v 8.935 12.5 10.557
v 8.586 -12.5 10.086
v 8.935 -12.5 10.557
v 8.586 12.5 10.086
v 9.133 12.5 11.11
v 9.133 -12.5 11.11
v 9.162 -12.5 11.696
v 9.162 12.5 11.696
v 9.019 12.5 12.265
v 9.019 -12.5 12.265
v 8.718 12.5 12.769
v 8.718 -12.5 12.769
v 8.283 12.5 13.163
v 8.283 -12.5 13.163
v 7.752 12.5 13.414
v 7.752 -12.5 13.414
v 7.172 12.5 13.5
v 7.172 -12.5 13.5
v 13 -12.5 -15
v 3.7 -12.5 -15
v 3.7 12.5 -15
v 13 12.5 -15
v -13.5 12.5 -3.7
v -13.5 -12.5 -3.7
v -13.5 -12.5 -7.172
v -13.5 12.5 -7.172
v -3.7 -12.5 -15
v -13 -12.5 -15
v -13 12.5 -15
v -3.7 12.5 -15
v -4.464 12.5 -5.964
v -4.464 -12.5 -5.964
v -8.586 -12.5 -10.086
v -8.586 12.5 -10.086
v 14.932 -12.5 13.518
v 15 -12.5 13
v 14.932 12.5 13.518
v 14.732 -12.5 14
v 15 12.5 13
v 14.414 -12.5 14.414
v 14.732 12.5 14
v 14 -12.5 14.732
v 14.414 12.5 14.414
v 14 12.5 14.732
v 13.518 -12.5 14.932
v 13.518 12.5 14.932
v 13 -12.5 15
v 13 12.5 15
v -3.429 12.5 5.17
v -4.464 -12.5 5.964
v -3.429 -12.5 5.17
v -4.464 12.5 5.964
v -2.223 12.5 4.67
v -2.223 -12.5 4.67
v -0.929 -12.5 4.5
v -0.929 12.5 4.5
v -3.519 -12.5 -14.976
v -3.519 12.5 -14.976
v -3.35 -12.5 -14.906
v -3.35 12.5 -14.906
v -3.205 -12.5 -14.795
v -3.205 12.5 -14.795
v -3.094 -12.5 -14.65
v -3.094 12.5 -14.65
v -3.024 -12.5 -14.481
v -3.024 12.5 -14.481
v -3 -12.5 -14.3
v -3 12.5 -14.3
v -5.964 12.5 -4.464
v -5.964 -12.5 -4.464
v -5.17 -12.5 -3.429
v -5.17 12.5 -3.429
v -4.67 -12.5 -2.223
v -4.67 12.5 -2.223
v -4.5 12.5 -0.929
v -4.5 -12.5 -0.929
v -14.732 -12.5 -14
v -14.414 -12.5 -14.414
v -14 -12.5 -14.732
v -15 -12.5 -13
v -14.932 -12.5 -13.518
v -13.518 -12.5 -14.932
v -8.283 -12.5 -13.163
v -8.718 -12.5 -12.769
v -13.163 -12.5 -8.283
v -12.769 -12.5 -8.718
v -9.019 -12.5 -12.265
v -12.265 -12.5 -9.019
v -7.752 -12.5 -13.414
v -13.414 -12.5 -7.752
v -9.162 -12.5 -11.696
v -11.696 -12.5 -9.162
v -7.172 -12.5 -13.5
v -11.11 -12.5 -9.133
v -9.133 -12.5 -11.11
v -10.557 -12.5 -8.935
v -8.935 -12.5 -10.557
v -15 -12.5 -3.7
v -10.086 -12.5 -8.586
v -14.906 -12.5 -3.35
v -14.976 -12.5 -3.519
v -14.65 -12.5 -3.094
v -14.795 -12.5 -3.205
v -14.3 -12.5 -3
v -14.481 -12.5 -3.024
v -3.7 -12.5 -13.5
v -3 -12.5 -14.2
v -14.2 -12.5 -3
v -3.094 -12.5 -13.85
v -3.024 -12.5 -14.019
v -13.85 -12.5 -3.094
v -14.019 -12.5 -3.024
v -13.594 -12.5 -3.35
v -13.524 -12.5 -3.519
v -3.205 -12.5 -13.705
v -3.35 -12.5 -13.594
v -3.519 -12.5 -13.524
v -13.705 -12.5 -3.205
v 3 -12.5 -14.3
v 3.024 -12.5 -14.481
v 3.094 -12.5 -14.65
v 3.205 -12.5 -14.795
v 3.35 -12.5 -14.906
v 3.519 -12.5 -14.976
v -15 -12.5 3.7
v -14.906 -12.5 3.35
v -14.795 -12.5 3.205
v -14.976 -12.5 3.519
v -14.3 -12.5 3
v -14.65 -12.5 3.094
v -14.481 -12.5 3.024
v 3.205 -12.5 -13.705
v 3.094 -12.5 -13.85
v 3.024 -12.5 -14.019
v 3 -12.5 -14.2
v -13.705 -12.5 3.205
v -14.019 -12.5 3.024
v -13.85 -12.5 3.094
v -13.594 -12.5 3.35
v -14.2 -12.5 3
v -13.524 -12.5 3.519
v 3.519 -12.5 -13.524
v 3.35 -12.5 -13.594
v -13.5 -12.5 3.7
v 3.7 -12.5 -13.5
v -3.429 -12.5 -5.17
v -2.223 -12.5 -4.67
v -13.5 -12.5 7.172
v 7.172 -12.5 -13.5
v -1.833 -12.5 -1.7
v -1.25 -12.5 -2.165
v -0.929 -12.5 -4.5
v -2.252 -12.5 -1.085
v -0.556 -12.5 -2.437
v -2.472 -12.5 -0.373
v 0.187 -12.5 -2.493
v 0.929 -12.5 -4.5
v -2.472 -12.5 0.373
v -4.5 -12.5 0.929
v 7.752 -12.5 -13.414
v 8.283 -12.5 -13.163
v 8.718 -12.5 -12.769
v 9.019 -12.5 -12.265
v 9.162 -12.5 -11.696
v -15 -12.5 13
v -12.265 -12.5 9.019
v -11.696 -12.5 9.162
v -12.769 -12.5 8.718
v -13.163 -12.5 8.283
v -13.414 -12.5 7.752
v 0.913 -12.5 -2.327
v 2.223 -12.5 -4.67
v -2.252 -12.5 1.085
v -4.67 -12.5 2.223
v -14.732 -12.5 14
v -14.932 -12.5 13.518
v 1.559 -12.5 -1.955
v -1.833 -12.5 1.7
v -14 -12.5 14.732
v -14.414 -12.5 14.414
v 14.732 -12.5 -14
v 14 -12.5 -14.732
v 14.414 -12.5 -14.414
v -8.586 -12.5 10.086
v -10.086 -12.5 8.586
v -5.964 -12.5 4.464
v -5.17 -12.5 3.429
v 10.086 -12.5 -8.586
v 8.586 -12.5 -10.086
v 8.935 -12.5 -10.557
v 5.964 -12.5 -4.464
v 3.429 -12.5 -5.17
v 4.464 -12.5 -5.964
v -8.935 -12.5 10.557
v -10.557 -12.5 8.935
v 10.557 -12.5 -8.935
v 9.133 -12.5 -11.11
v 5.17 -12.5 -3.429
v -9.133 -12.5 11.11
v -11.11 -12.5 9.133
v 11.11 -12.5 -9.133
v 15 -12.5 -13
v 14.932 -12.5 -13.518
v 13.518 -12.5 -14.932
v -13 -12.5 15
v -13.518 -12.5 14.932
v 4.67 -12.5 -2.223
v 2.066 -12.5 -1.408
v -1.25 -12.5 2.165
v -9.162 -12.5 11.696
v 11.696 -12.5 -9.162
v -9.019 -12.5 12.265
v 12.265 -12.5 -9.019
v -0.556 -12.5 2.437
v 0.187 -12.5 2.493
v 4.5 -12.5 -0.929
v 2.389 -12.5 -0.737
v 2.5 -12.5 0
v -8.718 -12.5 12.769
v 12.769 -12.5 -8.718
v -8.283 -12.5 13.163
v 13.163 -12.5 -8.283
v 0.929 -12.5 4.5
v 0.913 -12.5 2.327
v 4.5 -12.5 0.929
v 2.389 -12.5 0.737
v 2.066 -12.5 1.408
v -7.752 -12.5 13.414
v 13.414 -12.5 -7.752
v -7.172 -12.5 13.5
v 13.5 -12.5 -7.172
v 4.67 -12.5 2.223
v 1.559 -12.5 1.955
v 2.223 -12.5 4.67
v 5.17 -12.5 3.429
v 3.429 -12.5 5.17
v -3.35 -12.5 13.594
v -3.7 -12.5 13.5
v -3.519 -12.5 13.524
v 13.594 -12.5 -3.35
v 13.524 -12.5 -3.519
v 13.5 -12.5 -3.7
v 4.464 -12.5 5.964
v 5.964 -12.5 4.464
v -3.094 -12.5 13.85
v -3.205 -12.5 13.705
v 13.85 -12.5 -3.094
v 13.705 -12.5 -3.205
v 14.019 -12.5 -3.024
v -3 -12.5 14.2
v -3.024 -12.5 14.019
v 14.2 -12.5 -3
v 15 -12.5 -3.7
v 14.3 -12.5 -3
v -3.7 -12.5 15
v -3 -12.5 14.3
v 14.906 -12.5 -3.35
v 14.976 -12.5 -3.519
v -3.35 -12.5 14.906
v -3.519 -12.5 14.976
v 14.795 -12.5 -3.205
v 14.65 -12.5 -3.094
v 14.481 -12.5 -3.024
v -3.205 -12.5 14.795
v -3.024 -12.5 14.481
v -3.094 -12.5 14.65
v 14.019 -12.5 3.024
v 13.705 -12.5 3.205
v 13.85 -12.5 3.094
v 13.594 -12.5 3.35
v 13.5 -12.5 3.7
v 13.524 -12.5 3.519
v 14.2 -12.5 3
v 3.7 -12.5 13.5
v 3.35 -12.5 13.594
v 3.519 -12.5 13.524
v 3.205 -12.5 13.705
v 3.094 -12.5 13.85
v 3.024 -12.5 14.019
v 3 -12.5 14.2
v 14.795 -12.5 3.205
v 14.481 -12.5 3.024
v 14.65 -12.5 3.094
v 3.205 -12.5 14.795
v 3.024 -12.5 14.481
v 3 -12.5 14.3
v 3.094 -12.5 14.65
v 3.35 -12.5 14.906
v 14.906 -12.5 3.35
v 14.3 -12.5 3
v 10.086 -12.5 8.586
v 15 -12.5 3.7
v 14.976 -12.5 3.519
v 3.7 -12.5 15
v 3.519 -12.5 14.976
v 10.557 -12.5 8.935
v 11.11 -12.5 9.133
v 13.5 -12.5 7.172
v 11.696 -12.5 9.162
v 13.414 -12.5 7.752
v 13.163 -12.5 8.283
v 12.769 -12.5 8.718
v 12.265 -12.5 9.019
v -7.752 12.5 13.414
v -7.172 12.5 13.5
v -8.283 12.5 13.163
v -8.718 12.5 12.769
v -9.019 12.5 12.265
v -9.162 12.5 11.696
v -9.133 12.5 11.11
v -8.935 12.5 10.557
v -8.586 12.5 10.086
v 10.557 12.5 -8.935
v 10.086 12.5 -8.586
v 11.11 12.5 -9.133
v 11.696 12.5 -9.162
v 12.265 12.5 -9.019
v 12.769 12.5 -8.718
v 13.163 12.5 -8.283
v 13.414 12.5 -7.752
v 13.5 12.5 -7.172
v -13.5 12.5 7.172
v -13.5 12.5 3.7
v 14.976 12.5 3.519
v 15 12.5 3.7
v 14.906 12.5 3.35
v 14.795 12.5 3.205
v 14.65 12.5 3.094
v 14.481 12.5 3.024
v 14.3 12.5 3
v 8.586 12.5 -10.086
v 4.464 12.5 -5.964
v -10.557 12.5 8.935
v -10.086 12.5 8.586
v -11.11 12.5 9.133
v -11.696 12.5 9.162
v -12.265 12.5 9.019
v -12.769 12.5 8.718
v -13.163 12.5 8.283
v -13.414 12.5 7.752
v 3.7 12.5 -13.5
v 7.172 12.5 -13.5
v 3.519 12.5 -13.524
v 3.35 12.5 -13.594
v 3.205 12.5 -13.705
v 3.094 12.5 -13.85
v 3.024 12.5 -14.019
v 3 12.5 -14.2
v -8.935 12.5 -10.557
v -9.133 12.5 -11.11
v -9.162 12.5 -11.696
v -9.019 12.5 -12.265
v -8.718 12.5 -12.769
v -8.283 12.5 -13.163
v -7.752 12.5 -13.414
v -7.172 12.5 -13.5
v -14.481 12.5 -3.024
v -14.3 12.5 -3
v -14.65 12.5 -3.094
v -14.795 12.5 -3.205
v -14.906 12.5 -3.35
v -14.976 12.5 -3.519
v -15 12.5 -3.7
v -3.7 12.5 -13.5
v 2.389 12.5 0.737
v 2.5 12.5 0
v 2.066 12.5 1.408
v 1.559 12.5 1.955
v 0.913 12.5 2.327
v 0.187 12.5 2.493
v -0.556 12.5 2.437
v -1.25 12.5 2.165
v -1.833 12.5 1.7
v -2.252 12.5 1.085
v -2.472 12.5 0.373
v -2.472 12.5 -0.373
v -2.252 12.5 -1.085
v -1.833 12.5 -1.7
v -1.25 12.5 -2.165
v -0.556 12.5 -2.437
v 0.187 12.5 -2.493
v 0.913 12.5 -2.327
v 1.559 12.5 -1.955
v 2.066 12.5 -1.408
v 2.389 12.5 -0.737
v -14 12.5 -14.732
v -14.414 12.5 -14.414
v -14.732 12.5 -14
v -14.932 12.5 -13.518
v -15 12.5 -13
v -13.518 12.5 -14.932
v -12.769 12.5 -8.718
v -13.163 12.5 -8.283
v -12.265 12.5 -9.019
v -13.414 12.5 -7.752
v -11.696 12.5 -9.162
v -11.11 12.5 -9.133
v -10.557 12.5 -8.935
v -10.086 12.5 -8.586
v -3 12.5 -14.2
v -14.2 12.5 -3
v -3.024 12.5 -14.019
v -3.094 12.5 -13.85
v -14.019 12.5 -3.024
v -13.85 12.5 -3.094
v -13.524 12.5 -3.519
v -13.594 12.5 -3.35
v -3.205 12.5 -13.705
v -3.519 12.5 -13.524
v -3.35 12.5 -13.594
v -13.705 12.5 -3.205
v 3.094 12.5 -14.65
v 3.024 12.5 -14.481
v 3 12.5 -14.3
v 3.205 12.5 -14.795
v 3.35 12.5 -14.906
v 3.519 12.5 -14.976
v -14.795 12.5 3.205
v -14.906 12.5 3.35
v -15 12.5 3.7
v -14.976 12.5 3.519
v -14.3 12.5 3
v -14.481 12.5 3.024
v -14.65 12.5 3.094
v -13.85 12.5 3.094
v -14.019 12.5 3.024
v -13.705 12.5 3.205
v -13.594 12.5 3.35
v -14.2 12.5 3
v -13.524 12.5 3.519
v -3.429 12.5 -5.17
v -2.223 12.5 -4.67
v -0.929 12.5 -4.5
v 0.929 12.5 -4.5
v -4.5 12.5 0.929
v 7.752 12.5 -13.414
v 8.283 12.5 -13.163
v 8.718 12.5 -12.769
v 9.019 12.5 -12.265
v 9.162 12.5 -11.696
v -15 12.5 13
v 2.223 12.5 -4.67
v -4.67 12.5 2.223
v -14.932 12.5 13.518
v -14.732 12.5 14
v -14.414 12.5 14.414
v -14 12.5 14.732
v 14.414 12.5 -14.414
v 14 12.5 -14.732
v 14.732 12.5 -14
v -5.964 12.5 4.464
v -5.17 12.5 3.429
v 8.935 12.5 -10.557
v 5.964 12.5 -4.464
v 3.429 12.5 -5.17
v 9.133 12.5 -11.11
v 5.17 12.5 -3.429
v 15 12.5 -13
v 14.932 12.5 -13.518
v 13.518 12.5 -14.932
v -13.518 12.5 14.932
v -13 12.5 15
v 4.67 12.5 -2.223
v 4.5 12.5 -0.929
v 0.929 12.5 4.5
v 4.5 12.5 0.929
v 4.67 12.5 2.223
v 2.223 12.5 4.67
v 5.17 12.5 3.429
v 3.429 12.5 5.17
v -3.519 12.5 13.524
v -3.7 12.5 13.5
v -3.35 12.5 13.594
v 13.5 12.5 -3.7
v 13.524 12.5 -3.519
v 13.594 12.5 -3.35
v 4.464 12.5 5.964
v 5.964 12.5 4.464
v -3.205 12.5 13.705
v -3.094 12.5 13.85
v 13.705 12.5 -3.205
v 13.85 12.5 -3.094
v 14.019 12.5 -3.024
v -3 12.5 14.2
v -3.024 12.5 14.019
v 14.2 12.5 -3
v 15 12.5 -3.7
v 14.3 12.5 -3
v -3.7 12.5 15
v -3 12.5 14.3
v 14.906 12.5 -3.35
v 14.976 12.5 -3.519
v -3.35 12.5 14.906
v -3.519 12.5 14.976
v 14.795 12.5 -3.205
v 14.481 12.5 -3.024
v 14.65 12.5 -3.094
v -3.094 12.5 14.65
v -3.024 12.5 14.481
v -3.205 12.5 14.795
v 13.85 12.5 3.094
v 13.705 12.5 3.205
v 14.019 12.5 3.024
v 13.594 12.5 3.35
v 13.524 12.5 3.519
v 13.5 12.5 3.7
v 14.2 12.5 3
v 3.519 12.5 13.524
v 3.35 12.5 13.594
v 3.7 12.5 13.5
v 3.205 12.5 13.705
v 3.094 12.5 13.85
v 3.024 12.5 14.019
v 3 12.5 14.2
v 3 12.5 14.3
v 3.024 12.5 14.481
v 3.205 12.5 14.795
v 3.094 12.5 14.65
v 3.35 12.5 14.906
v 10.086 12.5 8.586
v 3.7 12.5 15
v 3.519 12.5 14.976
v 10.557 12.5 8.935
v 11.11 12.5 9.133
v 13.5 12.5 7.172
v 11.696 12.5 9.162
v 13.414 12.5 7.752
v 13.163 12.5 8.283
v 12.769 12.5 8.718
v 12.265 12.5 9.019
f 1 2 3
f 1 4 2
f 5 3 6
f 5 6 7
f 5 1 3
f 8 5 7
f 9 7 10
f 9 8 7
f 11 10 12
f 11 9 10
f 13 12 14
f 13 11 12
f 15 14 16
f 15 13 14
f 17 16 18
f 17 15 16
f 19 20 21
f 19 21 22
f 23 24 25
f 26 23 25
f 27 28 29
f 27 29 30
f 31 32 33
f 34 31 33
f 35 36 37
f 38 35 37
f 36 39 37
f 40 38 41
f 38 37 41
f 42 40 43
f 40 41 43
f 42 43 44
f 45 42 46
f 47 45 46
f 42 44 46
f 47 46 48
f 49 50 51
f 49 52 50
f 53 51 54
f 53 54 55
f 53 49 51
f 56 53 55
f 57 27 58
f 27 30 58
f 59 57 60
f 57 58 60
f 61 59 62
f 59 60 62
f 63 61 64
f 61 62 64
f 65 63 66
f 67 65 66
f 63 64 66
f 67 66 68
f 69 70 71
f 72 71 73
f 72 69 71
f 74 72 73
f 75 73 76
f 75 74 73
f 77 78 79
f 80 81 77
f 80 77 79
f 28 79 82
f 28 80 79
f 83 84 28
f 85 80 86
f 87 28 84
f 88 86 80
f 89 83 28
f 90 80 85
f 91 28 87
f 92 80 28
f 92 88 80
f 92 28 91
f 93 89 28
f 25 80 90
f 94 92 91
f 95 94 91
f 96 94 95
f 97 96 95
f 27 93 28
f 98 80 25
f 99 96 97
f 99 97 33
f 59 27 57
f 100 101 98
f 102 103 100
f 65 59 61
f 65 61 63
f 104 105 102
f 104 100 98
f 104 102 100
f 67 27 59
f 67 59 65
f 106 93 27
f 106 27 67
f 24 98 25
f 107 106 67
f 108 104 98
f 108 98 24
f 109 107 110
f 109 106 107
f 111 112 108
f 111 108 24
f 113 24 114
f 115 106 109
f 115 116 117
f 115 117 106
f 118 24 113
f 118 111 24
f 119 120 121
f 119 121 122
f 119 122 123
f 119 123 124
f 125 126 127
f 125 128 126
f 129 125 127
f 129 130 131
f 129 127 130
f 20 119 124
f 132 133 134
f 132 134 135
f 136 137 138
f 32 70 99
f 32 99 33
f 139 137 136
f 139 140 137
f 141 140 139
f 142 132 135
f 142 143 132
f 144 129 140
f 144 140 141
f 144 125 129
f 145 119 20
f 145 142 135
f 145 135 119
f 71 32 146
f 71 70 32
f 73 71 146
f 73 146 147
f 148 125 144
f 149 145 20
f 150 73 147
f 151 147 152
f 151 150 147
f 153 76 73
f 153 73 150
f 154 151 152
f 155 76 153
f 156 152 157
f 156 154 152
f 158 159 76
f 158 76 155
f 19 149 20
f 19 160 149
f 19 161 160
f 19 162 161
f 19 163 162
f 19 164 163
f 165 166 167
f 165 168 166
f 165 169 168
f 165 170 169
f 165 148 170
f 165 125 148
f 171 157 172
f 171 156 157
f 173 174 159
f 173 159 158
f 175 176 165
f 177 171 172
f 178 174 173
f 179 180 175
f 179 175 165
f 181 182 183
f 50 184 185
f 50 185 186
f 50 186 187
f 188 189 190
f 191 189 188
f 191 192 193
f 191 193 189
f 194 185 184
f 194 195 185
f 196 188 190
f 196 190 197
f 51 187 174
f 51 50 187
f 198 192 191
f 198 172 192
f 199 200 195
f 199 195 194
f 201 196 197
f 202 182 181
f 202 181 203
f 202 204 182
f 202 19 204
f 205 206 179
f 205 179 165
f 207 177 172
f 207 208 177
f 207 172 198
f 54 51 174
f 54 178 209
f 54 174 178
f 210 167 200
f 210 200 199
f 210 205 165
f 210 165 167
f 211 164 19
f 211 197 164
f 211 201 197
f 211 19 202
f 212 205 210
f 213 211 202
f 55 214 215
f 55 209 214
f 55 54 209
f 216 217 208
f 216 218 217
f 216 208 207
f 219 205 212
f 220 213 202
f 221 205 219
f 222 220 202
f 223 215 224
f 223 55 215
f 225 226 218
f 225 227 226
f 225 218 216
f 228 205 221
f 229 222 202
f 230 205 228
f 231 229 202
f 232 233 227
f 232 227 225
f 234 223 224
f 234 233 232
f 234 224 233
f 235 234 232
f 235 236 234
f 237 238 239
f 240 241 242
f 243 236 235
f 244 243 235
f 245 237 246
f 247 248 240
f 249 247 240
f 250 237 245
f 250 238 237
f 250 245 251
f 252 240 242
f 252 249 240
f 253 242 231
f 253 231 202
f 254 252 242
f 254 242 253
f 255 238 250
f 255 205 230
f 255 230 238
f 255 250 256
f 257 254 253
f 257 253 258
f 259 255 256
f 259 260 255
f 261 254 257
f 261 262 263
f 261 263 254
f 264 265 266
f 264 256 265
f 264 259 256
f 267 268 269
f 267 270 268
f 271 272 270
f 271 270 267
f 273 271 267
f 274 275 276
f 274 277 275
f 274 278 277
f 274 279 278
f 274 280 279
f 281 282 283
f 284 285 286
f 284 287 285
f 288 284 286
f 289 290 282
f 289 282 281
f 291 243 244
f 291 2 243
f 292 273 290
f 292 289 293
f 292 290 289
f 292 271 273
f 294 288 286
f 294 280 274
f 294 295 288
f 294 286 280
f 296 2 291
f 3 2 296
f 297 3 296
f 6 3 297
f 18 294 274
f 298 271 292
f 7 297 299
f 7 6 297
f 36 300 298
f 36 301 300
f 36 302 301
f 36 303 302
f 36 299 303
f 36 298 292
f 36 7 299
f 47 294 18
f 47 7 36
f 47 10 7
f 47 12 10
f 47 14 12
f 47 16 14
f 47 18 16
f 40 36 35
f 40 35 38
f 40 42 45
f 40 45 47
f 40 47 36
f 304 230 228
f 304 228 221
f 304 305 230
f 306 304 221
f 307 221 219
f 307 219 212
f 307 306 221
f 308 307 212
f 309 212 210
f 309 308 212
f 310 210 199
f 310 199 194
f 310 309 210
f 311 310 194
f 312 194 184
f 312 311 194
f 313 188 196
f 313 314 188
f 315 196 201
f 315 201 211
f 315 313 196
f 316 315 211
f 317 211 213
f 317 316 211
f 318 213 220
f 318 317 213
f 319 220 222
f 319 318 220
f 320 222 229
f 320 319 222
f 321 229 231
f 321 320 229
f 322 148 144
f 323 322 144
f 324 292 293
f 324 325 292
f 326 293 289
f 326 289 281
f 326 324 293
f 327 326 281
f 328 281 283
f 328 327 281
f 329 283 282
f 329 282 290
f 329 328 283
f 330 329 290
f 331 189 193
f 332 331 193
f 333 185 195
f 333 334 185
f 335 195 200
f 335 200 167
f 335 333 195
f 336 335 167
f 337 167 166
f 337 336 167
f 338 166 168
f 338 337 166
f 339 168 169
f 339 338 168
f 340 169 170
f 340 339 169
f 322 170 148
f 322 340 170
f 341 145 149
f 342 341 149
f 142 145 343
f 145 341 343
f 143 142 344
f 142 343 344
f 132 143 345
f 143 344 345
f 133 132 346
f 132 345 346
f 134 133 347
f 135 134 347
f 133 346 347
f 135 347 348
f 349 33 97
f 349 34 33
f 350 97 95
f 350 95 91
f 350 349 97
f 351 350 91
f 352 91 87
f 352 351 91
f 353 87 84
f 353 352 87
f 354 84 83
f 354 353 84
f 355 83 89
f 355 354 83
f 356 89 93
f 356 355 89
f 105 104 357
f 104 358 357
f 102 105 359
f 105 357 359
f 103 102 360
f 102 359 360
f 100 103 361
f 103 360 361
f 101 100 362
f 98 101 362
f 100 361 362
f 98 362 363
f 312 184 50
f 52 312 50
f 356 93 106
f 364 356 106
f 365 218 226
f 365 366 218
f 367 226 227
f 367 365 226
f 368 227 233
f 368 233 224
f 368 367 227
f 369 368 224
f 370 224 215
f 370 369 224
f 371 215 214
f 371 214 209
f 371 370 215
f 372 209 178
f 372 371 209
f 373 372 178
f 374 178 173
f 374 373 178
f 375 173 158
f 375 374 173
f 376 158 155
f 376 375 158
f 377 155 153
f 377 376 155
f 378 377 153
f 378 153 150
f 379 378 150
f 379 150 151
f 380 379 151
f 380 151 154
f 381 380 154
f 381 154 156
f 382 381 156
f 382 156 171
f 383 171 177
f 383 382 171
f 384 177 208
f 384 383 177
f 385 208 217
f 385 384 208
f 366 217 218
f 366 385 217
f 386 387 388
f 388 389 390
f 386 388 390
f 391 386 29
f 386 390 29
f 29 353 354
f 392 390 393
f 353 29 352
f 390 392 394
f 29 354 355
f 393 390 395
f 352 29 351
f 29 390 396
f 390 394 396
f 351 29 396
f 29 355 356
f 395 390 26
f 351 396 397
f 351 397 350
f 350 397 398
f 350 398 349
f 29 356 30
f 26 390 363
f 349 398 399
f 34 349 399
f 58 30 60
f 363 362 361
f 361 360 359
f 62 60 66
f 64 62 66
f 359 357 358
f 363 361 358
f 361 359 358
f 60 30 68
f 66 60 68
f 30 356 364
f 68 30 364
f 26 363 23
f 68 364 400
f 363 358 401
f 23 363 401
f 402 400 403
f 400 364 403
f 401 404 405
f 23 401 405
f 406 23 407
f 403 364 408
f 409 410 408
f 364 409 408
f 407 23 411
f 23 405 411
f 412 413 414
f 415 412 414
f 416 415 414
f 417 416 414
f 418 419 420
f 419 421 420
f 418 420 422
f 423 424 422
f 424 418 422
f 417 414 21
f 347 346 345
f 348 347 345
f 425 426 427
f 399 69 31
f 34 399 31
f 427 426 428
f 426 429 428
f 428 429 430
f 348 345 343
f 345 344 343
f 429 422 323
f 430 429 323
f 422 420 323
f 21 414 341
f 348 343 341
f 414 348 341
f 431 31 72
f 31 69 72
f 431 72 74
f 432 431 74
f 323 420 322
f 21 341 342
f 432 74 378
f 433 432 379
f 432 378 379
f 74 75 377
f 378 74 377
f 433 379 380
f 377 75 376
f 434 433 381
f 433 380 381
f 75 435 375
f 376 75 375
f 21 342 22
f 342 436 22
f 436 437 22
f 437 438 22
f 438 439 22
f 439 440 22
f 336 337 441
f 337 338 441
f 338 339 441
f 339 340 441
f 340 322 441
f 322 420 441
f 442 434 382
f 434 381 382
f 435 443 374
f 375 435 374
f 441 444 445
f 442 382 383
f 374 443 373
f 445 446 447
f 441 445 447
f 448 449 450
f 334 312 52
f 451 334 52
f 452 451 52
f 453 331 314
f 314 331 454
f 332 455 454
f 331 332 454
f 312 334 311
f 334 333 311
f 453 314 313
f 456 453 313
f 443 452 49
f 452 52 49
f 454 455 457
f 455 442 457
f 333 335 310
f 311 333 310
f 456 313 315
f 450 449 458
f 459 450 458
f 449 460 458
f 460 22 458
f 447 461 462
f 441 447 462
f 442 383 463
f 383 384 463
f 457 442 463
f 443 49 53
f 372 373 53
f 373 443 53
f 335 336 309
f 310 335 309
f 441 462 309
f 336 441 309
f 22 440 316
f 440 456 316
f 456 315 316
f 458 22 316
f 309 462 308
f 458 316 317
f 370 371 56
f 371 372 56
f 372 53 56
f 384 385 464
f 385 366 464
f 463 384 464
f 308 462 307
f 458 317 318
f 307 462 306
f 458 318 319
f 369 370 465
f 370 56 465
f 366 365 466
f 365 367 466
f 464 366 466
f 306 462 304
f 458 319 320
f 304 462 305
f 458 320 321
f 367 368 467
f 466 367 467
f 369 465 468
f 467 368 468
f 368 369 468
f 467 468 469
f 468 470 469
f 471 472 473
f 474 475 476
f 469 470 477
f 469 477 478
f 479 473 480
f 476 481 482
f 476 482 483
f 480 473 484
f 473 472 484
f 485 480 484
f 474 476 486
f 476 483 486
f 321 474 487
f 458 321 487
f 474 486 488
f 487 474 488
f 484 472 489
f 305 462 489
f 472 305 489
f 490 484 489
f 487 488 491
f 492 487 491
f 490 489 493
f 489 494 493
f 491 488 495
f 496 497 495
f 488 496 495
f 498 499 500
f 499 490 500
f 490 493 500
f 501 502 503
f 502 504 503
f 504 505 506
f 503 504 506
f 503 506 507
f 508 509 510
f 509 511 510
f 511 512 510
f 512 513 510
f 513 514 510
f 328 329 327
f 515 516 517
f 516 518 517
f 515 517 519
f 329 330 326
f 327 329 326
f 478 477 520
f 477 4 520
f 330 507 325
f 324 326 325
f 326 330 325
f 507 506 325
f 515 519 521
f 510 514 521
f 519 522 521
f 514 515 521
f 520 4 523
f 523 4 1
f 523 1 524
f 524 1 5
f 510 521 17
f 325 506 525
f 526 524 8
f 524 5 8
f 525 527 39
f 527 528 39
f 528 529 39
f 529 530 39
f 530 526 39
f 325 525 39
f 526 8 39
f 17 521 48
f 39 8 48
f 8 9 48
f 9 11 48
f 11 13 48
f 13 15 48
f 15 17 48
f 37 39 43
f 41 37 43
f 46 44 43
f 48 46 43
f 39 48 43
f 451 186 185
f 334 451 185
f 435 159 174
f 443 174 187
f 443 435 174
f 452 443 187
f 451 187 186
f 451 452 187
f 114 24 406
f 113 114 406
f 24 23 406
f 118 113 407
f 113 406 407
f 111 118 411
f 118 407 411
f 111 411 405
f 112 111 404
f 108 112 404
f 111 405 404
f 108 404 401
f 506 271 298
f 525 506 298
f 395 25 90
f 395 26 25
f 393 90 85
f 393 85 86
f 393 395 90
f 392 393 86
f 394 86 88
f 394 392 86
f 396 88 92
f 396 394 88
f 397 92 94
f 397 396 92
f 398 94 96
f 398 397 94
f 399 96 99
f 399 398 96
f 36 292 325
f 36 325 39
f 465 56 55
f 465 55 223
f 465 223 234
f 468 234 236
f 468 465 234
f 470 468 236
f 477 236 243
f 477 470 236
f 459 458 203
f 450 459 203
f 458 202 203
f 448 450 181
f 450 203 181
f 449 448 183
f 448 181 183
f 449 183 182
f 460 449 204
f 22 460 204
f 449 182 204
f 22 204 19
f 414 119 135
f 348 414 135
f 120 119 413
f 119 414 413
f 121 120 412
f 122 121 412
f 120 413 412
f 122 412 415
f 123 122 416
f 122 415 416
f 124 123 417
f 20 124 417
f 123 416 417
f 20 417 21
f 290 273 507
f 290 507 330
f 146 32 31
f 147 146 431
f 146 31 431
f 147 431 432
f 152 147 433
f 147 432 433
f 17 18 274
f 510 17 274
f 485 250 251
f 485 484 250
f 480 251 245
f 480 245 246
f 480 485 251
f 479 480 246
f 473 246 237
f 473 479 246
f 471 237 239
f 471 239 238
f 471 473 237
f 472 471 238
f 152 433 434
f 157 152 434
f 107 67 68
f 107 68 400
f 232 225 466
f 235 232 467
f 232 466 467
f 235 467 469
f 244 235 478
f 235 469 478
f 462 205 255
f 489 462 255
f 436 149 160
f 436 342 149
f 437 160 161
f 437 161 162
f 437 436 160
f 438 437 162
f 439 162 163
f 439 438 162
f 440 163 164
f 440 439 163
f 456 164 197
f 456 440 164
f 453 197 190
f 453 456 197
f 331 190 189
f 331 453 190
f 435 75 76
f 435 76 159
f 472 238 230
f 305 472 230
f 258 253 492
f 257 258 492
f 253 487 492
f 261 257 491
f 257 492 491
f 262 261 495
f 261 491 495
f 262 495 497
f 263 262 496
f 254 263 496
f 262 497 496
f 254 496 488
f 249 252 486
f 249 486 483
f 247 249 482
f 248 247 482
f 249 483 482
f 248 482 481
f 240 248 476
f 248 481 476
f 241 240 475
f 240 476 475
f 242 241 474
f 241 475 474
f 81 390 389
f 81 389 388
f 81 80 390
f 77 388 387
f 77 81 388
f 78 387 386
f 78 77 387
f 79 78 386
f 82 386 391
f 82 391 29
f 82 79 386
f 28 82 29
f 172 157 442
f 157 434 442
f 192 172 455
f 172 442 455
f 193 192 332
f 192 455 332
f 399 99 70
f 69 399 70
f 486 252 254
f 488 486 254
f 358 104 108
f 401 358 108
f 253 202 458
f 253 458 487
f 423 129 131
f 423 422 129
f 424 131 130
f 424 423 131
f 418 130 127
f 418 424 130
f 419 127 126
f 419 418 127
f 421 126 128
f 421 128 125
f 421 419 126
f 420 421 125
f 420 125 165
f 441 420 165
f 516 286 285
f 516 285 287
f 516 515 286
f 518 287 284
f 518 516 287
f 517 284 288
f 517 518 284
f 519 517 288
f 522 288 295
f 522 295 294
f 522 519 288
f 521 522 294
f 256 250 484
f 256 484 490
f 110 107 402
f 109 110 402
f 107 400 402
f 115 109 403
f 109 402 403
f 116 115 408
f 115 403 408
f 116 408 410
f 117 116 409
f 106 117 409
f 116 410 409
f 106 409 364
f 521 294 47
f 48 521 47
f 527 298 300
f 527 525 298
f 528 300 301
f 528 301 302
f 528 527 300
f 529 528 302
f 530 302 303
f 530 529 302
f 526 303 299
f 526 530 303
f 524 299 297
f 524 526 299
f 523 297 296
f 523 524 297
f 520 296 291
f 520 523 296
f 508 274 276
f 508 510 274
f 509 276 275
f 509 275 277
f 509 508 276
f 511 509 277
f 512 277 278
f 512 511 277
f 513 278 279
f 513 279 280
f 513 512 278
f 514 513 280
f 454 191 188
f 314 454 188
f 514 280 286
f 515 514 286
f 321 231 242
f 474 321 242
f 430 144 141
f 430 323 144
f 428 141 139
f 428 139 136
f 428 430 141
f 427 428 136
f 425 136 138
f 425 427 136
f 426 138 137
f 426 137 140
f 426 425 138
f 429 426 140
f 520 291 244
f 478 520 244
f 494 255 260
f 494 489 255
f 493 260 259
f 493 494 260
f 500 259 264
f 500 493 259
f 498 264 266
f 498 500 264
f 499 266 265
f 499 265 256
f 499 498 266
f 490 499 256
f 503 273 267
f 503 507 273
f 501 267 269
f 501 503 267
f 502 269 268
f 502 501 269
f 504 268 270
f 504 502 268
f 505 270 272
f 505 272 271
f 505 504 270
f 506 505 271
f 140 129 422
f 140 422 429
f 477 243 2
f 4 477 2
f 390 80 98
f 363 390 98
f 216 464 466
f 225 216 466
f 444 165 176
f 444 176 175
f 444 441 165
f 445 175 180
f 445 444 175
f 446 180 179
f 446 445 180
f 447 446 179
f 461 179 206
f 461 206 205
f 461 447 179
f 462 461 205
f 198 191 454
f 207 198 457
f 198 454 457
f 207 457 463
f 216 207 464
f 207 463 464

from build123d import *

# Parameters (mm, degrees)
F0_W     = 30
F0_H     = 30
F0_R     = 2.5
F1_DEPTH = 12.5
F2_R     = 2
F3_W     = 10.5
F3_H     = 6
F3_W_2   = 6
F3_H_2   = 10.5
F4_DEPTH = 25
F5_DEPTH = 25
F7_DEPTH = 25
F8_R     = 2
F9_R     = 0.7
F10_R    = 5


with BuildPart() as f1:
    # F0 (on Front) → F1 (new body, symmetric)
    with BuildSketch(Plane.XZ):
        Rectangle(F0_W, F0_H)
        Circle(F0_R, mode=Mode.SUBTRACT)
    extrude(amount=F1_DEPTH, both=True)

    # F2
    f2_edges = [f1.edges().sort_by_distance(p)[0] for p in [
        (15, 0, 15),
        (-15, 0, 15),
        (-15, 0, -15),
        (15, 0, -15),
    ]]
    fillet(f2_edges, radius=F2_R)

    # F3 (on face) → F4 (cut)
    with BuildSketch(Plane.XZ.offset(12.5)):
        with Locations((9.75, 0)):
            Rectangle(F3_W, F3_H)
        with Locations((0, 9.75)):
            Rectangle(F3_W_2, F3_H_2)
        with Locations((0, -9.75)):
            Rectangle(F3_W_2, F3_H_2)
        with Locations((-9.75, 0)):
            Rectangle(F3_W, F3_H)
    extrude(amount=-F4_DEPTH, mode=Mode.SUBTRACT)

    # F3 (on face) → F5 (cut)
    with BuildSketch(Plane.XZ.offset(12.5)):
        with Locations((9.75, 0)):
            Rectangle(F3_W, F3_H)
        with Locations((0, 9.75)):
            Rectangle(F3_W_2, F3_H_2)
        with Locations((0, -9.75)):
            Rectangle(F3_W_2, F3_H_2)
        with Locations((-9.75, 0)):
            Rectangle(F3_W, F3_H)
    extrude(amount=-F5_DEPTH, mode=Mode.SUBTRACT)

    # F6 (on face) → F7 (cut)
    with BuildSketch(Plane.XZ.offset(12.5)):
        Polygon((3, 13.5), (3, 4.5), (12, 13.5), align=None)
        Polygon((13.5, 12), (4.5, 3), (13.5, 3), align=None)
        Polygon((3, -4.5), (3, -13.5), (12, -13.5), align=None)
        Polygon((13.5, -3), (4.5, -3), (13.5, -12), align=None)
        Polygon((-3, 4.5), (-3, 13.5), (-12, 13.5), align=None)
        Polygon((-13.5, 3), (-4.5, 3), (-13.5, 12), align=None)
        Polygon((-13.5, -12), (-4.5, -3), (-13.5, -3), align=None)
        Polygon((-3, -13.5), (-3, -4.5), (-12, -13.5), align=None)
    extrude(amount=-F7_DEPTH, mode=Mode.SUBTRACT)

    # F8
    f8_edges = [f1.edges().sort_by_distance(p)[0] for p in [
        (-12, 0, -13.5),
        (12, 0, -13.5),
        (13.5, 0, -12),
        (-13.5, 0, -12),
        (13.5, 0, 12),
        (12, 0, 13.5),
        (-13.5, 0, 12),
        (-12, 0, 13.5),
    ]]
    fillet(f8_edges, radius=F8_R)

    # F9
    f9_edges = [f1.edges().sort_by_distance(p)[0] for p in [
        (13.5, 0, 3),
        (15, 0, 3),
        (15, 0, -3),
        (13.5, 0, -3),
        (3, 0, -15),
        (-3, 0, -15),
        (3, 0, -13.5),
        (-3, 0, -13.5),
        (-15, 0, -3),
        (-13.5, 0, -3),
        (-15, 0, 3),
        (-13.5, 0, 3),
        (3, 0, 13.5),
        (3, 0, 15),
        (-3, 0, 15),
        (-3, 0, 13.5),
    ]]
    fillet(f9_edges, radius=F9_R)

    # F10
    f10_edges = [f1.edges().sort_by_distance(p)[0] for p in [
        (4.5, 0, -3),
        (4.5, 0, 3),
        (-3, 0, -4.5),
        (3, 0, -4.5),
        (-4.5, 0, -3),
        (-4.5, 0, 3),
        (3, 0, 4.5),
        (-3, 0, 4.5),
    ]]
    fillet(f10_edges, radius=F10_R)


solid = f1.part
